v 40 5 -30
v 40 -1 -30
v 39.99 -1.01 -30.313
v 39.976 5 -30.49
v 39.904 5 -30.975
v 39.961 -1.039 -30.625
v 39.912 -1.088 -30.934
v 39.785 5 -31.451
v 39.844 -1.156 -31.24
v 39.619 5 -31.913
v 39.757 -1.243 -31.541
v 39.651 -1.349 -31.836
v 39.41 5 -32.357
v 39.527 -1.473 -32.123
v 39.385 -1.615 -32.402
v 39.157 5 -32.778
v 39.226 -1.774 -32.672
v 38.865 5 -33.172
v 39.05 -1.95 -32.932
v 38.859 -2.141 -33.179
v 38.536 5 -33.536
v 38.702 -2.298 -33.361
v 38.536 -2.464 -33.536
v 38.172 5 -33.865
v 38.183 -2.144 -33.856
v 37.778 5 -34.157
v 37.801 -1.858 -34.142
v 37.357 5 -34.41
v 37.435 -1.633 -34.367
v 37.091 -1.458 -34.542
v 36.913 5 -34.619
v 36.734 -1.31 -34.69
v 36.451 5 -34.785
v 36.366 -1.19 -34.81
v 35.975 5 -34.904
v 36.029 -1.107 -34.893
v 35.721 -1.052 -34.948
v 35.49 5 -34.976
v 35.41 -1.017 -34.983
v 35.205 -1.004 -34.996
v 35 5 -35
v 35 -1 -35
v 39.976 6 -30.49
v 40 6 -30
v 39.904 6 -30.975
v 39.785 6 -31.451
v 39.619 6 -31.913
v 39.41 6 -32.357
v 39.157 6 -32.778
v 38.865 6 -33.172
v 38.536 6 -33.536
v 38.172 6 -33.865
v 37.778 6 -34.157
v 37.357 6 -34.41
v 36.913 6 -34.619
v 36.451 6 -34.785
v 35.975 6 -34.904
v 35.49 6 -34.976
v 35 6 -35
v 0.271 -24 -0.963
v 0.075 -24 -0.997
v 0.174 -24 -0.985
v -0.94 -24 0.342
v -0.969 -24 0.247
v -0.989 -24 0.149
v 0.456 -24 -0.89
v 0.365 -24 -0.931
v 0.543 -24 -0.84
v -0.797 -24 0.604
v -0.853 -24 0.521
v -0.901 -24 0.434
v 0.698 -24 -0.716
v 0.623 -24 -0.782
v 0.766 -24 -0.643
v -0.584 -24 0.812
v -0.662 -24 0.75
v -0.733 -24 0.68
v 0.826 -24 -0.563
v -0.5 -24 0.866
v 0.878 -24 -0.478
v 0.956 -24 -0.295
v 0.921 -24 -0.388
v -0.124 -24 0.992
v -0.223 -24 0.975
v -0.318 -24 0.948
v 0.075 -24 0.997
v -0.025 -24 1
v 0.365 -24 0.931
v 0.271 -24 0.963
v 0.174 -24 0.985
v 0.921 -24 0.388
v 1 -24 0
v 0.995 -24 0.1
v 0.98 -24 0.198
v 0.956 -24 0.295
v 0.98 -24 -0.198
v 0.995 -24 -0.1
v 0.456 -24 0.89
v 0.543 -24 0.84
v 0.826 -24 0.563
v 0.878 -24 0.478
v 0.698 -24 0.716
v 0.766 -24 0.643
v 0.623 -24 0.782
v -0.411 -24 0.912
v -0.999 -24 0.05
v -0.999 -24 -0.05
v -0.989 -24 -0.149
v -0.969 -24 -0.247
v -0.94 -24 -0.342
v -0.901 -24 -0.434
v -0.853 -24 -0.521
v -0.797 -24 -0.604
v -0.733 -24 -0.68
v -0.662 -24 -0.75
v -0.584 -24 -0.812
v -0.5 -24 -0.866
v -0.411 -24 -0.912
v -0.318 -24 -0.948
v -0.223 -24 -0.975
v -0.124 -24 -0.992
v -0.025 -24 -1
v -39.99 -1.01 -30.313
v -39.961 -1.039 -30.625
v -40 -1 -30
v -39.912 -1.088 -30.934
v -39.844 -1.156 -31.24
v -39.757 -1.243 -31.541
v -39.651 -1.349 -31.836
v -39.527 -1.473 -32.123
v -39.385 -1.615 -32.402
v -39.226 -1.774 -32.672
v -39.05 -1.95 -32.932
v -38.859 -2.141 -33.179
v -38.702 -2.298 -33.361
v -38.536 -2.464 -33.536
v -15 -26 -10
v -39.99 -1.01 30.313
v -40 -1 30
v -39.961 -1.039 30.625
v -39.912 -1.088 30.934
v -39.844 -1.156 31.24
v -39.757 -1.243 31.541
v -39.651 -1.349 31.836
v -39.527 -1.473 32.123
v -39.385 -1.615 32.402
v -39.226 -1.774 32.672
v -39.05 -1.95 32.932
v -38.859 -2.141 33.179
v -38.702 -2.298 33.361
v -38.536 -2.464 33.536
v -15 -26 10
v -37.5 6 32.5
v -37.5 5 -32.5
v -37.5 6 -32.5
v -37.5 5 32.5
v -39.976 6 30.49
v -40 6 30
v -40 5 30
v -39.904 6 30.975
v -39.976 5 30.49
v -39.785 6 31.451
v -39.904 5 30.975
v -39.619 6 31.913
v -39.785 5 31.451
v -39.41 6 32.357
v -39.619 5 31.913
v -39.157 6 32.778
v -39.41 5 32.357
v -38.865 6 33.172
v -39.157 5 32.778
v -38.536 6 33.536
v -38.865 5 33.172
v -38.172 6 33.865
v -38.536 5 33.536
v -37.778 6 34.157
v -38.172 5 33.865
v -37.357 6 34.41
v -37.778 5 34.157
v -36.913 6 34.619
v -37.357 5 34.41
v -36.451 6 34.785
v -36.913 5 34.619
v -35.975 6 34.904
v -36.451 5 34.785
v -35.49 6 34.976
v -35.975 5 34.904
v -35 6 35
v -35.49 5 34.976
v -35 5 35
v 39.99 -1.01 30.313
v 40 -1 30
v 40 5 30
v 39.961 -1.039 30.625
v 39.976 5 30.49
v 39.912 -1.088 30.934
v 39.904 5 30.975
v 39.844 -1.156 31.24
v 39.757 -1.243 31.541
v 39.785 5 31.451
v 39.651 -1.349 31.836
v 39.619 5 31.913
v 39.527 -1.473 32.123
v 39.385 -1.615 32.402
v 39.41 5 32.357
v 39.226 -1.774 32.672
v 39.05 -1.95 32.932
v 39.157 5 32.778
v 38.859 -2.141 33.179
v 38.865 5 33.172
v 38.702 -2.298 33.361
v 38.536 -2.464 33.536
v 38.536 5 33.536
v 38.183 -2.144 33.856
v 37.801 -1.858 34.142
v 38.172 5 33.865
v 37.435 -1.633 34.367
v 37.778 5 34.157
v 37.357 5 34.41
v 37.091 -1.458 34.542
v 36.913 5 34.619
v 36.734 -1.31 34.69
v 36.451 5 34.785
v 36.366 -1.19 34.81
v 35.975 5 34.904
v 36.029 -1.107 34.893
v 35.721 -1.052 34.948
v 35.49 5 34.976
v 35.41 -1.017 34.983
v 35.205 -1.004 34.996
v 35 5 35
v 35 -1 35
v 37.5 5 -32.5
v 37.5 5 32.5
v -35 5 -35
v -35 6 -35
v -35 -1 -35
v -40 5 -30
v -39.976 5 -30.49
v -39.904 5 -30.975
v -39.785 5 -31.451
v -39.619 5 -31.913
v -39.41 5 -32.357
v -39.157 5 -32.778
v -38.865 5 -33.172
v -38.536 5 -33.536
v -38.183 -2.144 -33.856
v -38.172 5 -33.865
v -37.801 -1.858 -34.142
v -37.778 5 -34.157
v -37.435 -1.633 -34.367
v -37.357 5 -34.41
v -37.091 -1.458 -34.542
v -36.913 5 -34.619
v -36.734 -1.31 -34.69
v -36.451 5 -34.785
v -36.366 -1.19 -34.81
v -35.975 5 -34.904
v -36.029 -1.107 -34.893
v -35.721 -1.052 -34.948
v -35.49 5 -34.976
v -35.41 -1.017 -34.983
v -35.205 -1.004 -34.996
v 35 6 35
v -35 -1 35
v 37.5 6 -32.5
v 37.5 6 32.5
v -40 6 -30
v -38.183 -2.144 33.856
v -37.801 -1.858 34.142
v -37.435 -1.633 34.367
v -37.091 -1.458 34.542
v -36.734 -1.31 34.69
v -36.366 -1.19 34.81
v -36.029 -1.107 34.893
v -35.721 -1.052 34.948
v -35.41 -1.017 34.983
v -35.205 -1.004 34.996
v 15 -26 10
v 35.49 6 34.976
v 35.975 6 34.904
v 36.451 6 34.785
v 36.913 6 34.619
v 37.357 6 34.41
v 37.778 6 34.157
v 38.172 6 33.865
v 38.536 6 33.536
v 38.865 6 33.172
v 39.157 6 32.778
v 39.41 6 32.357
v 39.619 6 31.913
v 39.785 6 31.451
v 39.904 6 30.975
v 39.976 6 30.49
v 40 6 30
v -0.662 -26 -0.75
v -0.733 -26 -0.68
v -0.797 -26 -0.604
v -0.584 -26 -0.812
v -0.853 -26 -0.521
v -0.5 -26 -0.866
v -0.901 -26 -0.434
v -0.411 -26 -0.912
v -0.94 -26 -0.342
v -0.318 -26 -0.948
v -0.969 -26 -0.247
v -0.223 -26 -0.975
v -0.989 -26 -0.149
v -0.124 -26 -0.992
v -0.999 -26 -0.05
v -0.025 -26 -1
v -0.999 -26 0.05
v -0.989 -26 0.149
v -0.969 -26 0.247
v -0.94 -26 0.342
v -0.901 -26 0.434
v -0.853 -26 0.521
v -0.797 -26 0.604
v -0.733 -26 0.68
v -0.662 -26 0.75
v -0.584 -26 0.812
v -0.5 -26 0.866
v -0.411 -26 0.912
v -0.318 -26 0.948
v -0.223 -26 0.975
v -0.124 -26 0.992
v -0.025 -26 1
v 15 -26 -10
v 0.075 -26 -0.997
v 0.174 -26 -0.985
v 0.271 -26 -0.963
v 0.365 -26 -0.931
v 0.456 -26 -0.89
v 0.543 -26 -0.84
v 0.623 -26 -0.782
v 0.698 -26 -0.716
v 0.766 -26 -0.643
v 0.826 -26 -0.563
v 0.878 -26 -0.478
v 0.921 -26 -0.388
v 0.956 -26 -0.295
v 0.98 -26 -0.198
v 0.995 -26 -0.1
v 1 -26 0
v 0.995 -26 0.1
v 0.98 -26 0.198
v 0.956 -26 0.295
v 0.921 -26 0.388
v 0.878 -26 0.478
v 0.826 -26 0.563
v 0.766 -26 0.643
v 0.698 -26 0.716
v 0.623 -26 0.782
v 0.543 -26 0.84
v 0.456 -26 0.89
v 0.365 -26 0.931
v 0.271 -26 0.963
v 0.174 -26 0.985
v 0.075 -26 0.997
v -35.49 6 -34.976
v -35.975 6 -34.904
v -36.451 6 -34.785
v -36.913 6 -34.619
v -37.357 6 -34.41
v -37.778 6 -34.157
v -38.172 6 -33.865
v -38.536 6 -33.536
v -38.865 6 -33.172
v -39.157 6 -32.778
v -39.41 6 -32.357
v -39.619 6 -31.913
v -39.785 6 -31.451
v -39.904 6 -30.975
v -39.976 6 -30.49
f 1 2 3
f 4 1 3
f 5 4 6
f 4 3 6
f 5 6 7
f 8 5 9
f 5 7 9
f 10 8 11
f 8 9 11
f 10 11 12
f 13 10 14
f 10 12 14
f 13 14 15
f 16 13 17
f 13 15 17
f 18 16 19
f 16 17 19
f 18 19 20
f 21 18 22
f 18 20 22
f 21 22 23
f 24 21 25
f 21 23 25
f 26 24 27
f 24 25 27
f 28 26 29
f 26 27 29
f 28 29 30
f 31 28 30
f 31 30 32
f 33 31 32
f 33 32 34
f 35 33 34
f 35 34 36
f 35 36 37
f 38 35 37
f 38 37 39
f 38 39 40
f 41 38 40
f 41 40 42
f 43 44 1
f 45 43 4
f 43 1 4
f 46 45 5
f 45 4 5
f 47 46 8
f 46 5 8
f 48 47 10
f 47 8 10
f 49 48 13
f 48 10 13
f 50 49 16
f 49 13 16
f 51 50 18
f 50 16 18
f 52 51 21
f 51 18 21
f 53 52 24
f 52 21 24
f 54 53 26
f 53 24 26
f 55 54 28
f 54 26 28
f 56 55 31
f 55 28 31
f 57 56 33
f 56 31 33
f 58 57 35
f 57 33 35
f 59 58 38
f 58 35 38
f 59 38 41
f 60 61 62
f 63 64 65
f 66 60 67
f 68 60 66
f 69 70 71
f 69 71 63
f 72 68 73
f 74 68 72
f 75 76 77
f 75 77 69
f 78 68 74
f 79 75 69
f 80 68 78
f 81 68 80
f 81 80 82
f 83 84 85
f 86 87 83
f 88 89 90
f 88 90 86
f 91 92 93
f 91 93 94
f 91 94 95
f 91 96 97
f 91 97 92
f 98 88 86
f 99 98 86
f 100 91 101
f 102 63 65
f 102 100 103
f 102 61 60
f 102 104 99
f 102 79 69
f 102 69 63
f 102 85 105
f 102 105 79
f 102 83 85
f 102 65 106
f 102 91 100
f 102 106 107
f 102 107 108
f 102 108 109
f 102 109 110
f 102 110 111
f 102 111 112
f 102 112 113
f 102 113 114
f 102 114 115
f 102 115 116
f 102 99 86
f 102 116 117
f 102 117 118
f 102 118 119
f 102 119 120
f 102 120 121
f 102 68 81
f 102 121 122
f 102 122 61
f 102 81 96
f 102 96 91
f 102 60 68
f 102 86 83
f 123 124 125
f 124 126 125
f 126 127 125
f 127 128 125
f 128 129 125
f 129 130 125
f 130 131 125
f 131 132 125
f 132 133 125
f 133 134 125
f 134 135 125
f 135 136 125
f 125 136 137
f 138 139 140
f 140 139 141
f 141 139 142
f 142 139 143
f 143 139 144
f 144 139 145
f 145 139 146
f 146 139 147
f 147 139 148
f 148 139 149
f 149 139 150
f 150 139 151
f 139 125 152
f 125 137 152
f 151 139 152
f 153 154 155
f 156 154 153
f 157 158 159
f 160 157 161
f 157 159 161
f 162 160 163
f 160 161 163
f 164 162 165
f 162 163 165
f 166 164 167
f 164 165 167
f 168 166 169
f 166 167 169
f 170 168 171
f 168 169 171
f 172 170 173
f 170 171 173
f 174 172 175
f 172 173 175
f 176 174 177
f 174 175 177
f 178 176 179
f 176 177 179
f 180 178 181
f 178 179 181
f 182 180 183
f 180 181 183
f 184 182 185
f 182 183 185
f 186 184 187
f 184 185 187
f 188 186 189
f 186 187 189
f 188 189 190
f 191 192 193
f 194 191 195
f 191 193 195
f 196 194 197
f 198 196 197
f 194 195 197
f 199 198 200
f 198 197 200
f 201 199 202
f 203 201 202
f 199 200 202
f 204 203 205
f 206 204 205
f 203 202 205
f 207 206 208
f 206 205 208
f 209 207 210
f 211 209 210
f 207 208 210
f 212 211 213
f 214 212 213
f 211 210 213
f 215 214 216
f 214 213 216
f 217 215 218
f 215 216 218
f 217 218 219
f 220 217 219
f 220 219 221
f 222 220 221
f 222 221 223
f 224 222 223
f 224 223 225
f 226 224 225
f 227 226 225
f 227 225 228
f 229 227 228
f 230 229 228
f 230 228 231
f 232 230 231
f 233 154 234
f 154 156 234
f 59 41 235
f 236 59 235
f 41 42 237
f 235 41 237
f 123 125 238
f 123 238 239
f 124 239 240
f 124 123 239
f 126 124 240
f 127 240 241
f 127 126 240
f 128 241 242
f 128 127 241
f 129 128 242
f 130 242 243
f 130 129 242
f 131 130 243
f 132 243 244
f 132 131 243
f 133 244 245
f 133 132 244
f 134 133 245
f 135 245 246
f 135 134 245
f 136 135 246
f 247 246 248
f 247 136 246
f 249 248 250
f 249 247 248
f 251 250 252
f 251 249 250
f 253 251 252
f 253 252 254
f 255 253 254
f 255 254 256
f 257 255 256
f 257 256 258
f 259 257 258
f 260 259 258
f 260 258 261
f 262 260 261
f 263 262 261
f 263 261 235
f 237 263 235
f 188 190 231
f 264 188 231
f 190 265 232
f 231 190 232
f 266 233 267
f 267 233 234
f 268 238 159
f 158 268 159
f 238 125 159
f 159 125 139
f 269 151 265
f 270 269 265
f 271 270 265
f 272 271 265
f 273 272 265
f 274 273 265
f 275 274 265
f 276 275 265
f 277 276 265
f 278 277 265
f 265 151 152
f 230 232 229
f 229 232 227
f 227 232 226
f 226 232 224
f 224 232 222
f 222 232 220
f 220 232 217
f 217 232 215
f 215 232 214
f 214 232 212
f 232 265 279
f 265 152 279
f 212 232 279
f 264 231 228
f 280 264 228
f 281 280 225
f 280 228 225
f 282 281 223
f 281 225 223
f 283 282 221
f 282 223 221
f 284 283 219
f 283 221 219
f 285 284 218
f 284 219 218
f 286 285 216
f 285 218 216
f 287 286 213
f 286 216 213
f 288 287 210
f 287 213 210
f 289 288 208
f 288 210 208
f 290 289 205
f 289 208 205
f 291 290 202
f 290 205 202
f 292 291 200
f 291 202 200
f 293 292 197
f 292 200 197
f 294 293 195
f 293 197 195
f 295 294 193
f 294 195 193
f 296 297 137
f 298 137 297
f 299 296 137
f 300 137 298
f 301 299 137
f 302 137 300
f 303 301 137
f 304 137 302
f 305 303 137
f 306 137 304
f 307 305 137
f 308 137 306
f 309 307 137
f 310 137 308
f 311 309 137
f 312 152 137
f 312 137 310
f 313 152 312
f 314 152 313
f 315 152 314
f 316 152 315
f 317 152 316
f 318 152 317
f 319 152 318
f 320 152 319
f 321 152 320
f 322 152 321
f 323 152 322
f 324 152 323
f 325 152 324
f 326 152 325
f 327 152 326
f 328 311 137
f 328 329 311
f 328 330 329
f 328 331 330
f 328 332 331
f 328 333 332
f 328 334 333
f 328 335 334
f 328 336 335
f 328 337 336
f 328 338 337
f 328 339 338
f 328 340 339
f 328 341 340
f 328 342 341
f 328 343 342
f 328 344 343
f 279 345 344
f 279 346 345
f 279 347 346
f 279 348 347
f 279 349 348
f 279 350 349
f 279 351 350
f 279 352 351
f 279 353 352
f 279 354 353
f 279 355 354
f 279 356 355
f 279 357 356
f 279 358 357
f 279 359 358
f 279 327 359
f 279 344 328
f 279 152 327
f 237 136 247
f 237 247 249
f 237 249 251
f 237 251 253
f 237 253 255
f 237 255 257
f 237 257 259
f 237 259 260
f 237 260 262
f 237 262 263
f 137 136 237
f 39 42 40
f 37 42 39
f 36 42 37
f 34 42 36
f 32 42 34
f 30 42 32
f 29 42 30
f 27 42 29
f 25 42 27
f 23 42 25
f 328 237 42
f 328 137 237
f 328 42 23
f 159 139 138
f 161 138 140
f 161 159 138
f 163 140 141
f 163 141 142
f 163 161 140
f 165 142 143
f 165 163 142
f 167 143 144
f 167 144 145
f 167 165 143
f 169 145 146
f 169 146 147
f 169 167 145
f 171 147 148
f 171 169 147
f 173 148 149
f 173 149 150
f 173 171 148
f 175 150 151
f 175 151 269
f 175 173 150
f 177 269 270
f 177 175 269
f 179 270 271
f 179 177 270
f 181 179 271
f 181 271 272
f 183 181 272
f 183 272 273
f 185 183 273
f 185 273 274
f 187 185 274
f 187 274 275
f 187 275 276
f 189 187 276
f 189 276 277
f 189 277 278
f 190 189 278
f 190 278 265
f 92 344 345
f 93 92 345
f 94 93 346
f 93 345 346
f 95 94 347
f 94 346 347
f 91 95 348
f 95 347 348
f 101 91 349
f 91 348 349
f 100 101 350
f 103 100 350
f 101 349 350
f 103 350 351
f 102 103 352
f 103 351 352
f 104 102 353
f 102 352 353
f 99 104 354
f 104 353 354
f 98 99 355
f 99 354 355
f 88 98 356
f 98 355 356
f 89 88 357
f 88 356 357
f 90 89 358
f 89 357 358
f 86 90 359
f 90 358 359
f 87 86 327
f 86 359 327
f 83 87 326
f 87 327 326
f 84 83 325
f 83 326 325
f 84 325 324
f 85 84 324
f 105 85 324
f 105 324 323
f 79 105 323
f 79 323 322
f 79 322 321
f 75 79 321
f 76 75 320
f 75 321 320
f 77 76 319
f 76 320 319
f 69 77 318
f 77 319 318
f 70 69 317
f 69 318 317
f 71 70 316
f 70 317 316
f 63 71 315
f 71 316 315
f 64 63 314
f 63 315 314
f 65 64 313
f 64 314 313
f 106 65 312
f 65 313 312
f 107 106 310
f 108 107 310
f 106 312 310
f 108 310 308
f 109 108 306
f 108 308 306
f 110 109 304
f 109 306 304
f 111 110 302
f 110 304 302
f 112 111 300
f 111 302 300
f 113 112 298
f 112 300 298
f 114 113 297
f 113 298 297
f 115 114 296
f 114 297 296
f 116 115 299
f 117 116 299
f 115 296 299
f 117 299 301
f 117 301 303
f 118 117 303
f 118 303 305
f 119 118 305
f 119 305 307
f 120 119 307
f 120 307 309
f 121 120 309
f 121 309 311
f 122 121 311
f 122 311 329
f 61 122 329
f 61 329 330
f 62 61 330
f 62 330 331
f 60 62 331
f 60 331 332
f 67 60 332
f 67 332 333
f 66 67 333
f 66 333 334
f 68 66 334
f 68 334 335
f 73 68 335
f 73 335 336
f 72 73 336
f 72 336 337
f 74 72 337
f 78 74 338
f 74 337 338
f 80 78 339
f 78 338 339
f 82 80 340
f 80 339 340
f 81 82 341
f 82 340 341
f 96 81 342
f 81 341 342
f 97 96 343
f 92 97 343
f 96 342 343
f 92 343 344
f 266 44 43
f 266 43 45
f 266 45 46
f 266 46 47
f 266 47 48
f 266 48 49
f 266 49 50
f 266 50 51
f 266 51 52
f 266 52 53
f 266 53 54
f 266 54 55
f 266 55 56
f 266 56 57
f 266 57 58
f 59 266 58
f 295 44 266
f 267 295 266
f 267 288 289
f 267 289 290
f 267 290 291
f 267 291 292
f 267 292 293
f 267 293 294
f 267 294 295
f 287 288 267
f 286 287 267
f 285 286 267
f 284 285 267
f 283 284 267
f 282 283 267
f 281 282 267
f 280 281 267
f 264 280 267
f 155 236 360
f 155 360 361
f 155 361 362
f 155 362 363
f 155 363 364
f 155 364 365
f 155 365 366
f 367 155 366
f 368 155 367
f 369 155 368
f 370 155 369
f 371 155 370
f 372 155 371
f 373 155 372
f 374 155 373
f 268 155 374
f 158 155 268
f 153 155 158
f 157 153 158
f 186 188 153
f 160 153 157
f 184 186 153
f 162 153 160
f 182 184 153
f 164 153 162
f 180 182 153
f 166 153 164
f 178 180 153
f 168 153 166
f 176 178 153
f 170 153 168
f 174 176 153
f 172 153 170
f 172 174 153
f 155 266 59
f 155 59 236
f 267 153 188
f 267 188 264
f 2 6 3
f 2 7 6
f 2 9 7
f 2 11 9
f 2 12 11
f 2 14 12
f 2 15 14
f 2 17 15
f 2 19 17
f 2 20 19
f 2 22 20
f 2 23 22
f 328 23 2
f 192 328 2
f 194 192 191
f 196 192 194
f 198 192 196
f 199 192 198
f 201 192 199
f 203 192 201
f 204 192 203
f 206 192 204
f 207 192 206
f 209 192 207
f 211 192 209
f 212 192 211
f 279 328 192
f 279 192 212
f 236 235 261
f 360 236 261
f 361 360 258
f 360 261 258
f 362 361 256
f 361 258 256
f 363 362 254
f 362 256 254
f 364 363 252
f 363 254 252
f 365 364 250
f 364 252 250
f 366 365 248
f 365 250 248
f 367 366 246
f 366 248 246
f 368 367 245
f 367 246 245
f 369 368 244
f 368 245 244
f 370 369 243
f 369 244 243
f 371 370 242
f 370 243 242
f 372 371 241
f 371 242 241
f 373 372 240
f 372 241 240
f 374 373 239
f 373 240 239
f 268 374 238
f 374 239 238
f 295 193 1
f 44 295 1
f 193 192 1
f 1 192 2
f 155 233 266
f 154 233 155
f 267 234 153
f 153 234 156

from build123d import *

# Parameters (mm, degrees)
F0_W     = 80
F0_H     = 70
F1_DEPTH = 26
F2_SIZE  = 25
F3_DEPTH = 5
F4_R     = 5
F5_W     = 75
F5_H     = 65
F6_DEPTH = 1
F7_R     = 1
F8_DEPTH = 2


with BuildPart() as f1:
    # F0 (on Front) → F1 (new body)
    with BuildSketch(Plane.XZ):
        Rectangle(F0_W, F0_H)
    extrude(amount=F1_DEPTH)

    # F2
    f2_edges = [f1.edges().sort_by_distance(p)[0] for p in [
        (0, -26, -35),
        (40, -26, 0),
        (0, -26, 35),
        (-40, -26, 0),
    ]]
    chamfer(f2_edges, length=F2_SIZE)

    # F3 (add): a face of the model
    f3_faces = [f1.faces().sort_by_distance(p)[0] for p in [
        (0, 0, 0),
    ]]
    extrude(f3_faces, amount=F3_DEPTH)

    # F4
    f4_edges = [f1.edges().sort_by_distance(p)[0] for p in [
        (40, 2, 35),
        (-40, 2, 35),
        (40, 2, -35),
        (-40, 2, -35),
    ]]
    fillet(f4_edges, radius=F4_R)

    # F5 (on face) → F6 (join)
    with BuildSketch(Plane(origin=(0, 5, 0), x_dir=(-1, 0, 0), z_dir=(0, 1, 0))):
        with BuildLine():
            ThreePointArc((-40, -30), (-38.5355339059, -33.5355339059), (-35, -35))
            Line((-35, -35), (35, -35))
            ThreePointArc((35, -35), (38.5355339059, -33.5355339059), (40, -30))
            Line((40, -30), (40, 30))
            ThreePointArc((40, 30), (38.5355339059, 33.5355339059), (35, 35))
            Line((35, 35), (-35, 35))
            ThreePointArc((-35, 35), (-38.5355339059, 33.5355339059), (-40, 30))
            Line((-40, 30), (-40, -30))
        make_face()
        Rectangle(F5_W, F5_H, mode=Mode.SUBTRACT)
    extrude(amount=F6_DEPTH)

    # F7 (on face) → F8 (cut)
    with BuildSketch(Plane.XZ.offset(26)):
        Circle(F7_R)
    extrude(amount=-F8_DEPTH, mode=Mode.SUBTRACT)


solid = f1.part
